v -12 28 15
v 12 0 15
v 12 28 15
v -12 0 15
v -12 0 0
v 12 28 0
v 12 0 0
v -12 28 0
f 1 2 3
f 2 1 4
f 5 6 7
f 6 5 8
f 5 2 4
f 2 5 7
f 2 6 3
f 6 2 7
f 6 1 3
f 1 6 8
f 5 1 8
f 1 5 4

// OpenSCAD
// file: Library/center.scad
module center(axis){
	translate((axis / -2.0)){
		children();
	}
}
// main file
use <Library/center.scad>

//Length, width, height. Length is how far it should stick out from the center of the flue (so the flue radius). The width is the diameter of the object. The height is the height of the object.
dimensions = [24.0, 28.0, 15.0];

//Opening at the bottom. Negative space
module CylinderDispenser_Dispenser_Flue_Fireplace(dimensions) {
	center([dimensions.x, 0, 0]){
		cube(dimensions);
	}
}

color("red", .5)
CylinderDispenser_Dispenser_Flue_Fireplace(dimensions);
